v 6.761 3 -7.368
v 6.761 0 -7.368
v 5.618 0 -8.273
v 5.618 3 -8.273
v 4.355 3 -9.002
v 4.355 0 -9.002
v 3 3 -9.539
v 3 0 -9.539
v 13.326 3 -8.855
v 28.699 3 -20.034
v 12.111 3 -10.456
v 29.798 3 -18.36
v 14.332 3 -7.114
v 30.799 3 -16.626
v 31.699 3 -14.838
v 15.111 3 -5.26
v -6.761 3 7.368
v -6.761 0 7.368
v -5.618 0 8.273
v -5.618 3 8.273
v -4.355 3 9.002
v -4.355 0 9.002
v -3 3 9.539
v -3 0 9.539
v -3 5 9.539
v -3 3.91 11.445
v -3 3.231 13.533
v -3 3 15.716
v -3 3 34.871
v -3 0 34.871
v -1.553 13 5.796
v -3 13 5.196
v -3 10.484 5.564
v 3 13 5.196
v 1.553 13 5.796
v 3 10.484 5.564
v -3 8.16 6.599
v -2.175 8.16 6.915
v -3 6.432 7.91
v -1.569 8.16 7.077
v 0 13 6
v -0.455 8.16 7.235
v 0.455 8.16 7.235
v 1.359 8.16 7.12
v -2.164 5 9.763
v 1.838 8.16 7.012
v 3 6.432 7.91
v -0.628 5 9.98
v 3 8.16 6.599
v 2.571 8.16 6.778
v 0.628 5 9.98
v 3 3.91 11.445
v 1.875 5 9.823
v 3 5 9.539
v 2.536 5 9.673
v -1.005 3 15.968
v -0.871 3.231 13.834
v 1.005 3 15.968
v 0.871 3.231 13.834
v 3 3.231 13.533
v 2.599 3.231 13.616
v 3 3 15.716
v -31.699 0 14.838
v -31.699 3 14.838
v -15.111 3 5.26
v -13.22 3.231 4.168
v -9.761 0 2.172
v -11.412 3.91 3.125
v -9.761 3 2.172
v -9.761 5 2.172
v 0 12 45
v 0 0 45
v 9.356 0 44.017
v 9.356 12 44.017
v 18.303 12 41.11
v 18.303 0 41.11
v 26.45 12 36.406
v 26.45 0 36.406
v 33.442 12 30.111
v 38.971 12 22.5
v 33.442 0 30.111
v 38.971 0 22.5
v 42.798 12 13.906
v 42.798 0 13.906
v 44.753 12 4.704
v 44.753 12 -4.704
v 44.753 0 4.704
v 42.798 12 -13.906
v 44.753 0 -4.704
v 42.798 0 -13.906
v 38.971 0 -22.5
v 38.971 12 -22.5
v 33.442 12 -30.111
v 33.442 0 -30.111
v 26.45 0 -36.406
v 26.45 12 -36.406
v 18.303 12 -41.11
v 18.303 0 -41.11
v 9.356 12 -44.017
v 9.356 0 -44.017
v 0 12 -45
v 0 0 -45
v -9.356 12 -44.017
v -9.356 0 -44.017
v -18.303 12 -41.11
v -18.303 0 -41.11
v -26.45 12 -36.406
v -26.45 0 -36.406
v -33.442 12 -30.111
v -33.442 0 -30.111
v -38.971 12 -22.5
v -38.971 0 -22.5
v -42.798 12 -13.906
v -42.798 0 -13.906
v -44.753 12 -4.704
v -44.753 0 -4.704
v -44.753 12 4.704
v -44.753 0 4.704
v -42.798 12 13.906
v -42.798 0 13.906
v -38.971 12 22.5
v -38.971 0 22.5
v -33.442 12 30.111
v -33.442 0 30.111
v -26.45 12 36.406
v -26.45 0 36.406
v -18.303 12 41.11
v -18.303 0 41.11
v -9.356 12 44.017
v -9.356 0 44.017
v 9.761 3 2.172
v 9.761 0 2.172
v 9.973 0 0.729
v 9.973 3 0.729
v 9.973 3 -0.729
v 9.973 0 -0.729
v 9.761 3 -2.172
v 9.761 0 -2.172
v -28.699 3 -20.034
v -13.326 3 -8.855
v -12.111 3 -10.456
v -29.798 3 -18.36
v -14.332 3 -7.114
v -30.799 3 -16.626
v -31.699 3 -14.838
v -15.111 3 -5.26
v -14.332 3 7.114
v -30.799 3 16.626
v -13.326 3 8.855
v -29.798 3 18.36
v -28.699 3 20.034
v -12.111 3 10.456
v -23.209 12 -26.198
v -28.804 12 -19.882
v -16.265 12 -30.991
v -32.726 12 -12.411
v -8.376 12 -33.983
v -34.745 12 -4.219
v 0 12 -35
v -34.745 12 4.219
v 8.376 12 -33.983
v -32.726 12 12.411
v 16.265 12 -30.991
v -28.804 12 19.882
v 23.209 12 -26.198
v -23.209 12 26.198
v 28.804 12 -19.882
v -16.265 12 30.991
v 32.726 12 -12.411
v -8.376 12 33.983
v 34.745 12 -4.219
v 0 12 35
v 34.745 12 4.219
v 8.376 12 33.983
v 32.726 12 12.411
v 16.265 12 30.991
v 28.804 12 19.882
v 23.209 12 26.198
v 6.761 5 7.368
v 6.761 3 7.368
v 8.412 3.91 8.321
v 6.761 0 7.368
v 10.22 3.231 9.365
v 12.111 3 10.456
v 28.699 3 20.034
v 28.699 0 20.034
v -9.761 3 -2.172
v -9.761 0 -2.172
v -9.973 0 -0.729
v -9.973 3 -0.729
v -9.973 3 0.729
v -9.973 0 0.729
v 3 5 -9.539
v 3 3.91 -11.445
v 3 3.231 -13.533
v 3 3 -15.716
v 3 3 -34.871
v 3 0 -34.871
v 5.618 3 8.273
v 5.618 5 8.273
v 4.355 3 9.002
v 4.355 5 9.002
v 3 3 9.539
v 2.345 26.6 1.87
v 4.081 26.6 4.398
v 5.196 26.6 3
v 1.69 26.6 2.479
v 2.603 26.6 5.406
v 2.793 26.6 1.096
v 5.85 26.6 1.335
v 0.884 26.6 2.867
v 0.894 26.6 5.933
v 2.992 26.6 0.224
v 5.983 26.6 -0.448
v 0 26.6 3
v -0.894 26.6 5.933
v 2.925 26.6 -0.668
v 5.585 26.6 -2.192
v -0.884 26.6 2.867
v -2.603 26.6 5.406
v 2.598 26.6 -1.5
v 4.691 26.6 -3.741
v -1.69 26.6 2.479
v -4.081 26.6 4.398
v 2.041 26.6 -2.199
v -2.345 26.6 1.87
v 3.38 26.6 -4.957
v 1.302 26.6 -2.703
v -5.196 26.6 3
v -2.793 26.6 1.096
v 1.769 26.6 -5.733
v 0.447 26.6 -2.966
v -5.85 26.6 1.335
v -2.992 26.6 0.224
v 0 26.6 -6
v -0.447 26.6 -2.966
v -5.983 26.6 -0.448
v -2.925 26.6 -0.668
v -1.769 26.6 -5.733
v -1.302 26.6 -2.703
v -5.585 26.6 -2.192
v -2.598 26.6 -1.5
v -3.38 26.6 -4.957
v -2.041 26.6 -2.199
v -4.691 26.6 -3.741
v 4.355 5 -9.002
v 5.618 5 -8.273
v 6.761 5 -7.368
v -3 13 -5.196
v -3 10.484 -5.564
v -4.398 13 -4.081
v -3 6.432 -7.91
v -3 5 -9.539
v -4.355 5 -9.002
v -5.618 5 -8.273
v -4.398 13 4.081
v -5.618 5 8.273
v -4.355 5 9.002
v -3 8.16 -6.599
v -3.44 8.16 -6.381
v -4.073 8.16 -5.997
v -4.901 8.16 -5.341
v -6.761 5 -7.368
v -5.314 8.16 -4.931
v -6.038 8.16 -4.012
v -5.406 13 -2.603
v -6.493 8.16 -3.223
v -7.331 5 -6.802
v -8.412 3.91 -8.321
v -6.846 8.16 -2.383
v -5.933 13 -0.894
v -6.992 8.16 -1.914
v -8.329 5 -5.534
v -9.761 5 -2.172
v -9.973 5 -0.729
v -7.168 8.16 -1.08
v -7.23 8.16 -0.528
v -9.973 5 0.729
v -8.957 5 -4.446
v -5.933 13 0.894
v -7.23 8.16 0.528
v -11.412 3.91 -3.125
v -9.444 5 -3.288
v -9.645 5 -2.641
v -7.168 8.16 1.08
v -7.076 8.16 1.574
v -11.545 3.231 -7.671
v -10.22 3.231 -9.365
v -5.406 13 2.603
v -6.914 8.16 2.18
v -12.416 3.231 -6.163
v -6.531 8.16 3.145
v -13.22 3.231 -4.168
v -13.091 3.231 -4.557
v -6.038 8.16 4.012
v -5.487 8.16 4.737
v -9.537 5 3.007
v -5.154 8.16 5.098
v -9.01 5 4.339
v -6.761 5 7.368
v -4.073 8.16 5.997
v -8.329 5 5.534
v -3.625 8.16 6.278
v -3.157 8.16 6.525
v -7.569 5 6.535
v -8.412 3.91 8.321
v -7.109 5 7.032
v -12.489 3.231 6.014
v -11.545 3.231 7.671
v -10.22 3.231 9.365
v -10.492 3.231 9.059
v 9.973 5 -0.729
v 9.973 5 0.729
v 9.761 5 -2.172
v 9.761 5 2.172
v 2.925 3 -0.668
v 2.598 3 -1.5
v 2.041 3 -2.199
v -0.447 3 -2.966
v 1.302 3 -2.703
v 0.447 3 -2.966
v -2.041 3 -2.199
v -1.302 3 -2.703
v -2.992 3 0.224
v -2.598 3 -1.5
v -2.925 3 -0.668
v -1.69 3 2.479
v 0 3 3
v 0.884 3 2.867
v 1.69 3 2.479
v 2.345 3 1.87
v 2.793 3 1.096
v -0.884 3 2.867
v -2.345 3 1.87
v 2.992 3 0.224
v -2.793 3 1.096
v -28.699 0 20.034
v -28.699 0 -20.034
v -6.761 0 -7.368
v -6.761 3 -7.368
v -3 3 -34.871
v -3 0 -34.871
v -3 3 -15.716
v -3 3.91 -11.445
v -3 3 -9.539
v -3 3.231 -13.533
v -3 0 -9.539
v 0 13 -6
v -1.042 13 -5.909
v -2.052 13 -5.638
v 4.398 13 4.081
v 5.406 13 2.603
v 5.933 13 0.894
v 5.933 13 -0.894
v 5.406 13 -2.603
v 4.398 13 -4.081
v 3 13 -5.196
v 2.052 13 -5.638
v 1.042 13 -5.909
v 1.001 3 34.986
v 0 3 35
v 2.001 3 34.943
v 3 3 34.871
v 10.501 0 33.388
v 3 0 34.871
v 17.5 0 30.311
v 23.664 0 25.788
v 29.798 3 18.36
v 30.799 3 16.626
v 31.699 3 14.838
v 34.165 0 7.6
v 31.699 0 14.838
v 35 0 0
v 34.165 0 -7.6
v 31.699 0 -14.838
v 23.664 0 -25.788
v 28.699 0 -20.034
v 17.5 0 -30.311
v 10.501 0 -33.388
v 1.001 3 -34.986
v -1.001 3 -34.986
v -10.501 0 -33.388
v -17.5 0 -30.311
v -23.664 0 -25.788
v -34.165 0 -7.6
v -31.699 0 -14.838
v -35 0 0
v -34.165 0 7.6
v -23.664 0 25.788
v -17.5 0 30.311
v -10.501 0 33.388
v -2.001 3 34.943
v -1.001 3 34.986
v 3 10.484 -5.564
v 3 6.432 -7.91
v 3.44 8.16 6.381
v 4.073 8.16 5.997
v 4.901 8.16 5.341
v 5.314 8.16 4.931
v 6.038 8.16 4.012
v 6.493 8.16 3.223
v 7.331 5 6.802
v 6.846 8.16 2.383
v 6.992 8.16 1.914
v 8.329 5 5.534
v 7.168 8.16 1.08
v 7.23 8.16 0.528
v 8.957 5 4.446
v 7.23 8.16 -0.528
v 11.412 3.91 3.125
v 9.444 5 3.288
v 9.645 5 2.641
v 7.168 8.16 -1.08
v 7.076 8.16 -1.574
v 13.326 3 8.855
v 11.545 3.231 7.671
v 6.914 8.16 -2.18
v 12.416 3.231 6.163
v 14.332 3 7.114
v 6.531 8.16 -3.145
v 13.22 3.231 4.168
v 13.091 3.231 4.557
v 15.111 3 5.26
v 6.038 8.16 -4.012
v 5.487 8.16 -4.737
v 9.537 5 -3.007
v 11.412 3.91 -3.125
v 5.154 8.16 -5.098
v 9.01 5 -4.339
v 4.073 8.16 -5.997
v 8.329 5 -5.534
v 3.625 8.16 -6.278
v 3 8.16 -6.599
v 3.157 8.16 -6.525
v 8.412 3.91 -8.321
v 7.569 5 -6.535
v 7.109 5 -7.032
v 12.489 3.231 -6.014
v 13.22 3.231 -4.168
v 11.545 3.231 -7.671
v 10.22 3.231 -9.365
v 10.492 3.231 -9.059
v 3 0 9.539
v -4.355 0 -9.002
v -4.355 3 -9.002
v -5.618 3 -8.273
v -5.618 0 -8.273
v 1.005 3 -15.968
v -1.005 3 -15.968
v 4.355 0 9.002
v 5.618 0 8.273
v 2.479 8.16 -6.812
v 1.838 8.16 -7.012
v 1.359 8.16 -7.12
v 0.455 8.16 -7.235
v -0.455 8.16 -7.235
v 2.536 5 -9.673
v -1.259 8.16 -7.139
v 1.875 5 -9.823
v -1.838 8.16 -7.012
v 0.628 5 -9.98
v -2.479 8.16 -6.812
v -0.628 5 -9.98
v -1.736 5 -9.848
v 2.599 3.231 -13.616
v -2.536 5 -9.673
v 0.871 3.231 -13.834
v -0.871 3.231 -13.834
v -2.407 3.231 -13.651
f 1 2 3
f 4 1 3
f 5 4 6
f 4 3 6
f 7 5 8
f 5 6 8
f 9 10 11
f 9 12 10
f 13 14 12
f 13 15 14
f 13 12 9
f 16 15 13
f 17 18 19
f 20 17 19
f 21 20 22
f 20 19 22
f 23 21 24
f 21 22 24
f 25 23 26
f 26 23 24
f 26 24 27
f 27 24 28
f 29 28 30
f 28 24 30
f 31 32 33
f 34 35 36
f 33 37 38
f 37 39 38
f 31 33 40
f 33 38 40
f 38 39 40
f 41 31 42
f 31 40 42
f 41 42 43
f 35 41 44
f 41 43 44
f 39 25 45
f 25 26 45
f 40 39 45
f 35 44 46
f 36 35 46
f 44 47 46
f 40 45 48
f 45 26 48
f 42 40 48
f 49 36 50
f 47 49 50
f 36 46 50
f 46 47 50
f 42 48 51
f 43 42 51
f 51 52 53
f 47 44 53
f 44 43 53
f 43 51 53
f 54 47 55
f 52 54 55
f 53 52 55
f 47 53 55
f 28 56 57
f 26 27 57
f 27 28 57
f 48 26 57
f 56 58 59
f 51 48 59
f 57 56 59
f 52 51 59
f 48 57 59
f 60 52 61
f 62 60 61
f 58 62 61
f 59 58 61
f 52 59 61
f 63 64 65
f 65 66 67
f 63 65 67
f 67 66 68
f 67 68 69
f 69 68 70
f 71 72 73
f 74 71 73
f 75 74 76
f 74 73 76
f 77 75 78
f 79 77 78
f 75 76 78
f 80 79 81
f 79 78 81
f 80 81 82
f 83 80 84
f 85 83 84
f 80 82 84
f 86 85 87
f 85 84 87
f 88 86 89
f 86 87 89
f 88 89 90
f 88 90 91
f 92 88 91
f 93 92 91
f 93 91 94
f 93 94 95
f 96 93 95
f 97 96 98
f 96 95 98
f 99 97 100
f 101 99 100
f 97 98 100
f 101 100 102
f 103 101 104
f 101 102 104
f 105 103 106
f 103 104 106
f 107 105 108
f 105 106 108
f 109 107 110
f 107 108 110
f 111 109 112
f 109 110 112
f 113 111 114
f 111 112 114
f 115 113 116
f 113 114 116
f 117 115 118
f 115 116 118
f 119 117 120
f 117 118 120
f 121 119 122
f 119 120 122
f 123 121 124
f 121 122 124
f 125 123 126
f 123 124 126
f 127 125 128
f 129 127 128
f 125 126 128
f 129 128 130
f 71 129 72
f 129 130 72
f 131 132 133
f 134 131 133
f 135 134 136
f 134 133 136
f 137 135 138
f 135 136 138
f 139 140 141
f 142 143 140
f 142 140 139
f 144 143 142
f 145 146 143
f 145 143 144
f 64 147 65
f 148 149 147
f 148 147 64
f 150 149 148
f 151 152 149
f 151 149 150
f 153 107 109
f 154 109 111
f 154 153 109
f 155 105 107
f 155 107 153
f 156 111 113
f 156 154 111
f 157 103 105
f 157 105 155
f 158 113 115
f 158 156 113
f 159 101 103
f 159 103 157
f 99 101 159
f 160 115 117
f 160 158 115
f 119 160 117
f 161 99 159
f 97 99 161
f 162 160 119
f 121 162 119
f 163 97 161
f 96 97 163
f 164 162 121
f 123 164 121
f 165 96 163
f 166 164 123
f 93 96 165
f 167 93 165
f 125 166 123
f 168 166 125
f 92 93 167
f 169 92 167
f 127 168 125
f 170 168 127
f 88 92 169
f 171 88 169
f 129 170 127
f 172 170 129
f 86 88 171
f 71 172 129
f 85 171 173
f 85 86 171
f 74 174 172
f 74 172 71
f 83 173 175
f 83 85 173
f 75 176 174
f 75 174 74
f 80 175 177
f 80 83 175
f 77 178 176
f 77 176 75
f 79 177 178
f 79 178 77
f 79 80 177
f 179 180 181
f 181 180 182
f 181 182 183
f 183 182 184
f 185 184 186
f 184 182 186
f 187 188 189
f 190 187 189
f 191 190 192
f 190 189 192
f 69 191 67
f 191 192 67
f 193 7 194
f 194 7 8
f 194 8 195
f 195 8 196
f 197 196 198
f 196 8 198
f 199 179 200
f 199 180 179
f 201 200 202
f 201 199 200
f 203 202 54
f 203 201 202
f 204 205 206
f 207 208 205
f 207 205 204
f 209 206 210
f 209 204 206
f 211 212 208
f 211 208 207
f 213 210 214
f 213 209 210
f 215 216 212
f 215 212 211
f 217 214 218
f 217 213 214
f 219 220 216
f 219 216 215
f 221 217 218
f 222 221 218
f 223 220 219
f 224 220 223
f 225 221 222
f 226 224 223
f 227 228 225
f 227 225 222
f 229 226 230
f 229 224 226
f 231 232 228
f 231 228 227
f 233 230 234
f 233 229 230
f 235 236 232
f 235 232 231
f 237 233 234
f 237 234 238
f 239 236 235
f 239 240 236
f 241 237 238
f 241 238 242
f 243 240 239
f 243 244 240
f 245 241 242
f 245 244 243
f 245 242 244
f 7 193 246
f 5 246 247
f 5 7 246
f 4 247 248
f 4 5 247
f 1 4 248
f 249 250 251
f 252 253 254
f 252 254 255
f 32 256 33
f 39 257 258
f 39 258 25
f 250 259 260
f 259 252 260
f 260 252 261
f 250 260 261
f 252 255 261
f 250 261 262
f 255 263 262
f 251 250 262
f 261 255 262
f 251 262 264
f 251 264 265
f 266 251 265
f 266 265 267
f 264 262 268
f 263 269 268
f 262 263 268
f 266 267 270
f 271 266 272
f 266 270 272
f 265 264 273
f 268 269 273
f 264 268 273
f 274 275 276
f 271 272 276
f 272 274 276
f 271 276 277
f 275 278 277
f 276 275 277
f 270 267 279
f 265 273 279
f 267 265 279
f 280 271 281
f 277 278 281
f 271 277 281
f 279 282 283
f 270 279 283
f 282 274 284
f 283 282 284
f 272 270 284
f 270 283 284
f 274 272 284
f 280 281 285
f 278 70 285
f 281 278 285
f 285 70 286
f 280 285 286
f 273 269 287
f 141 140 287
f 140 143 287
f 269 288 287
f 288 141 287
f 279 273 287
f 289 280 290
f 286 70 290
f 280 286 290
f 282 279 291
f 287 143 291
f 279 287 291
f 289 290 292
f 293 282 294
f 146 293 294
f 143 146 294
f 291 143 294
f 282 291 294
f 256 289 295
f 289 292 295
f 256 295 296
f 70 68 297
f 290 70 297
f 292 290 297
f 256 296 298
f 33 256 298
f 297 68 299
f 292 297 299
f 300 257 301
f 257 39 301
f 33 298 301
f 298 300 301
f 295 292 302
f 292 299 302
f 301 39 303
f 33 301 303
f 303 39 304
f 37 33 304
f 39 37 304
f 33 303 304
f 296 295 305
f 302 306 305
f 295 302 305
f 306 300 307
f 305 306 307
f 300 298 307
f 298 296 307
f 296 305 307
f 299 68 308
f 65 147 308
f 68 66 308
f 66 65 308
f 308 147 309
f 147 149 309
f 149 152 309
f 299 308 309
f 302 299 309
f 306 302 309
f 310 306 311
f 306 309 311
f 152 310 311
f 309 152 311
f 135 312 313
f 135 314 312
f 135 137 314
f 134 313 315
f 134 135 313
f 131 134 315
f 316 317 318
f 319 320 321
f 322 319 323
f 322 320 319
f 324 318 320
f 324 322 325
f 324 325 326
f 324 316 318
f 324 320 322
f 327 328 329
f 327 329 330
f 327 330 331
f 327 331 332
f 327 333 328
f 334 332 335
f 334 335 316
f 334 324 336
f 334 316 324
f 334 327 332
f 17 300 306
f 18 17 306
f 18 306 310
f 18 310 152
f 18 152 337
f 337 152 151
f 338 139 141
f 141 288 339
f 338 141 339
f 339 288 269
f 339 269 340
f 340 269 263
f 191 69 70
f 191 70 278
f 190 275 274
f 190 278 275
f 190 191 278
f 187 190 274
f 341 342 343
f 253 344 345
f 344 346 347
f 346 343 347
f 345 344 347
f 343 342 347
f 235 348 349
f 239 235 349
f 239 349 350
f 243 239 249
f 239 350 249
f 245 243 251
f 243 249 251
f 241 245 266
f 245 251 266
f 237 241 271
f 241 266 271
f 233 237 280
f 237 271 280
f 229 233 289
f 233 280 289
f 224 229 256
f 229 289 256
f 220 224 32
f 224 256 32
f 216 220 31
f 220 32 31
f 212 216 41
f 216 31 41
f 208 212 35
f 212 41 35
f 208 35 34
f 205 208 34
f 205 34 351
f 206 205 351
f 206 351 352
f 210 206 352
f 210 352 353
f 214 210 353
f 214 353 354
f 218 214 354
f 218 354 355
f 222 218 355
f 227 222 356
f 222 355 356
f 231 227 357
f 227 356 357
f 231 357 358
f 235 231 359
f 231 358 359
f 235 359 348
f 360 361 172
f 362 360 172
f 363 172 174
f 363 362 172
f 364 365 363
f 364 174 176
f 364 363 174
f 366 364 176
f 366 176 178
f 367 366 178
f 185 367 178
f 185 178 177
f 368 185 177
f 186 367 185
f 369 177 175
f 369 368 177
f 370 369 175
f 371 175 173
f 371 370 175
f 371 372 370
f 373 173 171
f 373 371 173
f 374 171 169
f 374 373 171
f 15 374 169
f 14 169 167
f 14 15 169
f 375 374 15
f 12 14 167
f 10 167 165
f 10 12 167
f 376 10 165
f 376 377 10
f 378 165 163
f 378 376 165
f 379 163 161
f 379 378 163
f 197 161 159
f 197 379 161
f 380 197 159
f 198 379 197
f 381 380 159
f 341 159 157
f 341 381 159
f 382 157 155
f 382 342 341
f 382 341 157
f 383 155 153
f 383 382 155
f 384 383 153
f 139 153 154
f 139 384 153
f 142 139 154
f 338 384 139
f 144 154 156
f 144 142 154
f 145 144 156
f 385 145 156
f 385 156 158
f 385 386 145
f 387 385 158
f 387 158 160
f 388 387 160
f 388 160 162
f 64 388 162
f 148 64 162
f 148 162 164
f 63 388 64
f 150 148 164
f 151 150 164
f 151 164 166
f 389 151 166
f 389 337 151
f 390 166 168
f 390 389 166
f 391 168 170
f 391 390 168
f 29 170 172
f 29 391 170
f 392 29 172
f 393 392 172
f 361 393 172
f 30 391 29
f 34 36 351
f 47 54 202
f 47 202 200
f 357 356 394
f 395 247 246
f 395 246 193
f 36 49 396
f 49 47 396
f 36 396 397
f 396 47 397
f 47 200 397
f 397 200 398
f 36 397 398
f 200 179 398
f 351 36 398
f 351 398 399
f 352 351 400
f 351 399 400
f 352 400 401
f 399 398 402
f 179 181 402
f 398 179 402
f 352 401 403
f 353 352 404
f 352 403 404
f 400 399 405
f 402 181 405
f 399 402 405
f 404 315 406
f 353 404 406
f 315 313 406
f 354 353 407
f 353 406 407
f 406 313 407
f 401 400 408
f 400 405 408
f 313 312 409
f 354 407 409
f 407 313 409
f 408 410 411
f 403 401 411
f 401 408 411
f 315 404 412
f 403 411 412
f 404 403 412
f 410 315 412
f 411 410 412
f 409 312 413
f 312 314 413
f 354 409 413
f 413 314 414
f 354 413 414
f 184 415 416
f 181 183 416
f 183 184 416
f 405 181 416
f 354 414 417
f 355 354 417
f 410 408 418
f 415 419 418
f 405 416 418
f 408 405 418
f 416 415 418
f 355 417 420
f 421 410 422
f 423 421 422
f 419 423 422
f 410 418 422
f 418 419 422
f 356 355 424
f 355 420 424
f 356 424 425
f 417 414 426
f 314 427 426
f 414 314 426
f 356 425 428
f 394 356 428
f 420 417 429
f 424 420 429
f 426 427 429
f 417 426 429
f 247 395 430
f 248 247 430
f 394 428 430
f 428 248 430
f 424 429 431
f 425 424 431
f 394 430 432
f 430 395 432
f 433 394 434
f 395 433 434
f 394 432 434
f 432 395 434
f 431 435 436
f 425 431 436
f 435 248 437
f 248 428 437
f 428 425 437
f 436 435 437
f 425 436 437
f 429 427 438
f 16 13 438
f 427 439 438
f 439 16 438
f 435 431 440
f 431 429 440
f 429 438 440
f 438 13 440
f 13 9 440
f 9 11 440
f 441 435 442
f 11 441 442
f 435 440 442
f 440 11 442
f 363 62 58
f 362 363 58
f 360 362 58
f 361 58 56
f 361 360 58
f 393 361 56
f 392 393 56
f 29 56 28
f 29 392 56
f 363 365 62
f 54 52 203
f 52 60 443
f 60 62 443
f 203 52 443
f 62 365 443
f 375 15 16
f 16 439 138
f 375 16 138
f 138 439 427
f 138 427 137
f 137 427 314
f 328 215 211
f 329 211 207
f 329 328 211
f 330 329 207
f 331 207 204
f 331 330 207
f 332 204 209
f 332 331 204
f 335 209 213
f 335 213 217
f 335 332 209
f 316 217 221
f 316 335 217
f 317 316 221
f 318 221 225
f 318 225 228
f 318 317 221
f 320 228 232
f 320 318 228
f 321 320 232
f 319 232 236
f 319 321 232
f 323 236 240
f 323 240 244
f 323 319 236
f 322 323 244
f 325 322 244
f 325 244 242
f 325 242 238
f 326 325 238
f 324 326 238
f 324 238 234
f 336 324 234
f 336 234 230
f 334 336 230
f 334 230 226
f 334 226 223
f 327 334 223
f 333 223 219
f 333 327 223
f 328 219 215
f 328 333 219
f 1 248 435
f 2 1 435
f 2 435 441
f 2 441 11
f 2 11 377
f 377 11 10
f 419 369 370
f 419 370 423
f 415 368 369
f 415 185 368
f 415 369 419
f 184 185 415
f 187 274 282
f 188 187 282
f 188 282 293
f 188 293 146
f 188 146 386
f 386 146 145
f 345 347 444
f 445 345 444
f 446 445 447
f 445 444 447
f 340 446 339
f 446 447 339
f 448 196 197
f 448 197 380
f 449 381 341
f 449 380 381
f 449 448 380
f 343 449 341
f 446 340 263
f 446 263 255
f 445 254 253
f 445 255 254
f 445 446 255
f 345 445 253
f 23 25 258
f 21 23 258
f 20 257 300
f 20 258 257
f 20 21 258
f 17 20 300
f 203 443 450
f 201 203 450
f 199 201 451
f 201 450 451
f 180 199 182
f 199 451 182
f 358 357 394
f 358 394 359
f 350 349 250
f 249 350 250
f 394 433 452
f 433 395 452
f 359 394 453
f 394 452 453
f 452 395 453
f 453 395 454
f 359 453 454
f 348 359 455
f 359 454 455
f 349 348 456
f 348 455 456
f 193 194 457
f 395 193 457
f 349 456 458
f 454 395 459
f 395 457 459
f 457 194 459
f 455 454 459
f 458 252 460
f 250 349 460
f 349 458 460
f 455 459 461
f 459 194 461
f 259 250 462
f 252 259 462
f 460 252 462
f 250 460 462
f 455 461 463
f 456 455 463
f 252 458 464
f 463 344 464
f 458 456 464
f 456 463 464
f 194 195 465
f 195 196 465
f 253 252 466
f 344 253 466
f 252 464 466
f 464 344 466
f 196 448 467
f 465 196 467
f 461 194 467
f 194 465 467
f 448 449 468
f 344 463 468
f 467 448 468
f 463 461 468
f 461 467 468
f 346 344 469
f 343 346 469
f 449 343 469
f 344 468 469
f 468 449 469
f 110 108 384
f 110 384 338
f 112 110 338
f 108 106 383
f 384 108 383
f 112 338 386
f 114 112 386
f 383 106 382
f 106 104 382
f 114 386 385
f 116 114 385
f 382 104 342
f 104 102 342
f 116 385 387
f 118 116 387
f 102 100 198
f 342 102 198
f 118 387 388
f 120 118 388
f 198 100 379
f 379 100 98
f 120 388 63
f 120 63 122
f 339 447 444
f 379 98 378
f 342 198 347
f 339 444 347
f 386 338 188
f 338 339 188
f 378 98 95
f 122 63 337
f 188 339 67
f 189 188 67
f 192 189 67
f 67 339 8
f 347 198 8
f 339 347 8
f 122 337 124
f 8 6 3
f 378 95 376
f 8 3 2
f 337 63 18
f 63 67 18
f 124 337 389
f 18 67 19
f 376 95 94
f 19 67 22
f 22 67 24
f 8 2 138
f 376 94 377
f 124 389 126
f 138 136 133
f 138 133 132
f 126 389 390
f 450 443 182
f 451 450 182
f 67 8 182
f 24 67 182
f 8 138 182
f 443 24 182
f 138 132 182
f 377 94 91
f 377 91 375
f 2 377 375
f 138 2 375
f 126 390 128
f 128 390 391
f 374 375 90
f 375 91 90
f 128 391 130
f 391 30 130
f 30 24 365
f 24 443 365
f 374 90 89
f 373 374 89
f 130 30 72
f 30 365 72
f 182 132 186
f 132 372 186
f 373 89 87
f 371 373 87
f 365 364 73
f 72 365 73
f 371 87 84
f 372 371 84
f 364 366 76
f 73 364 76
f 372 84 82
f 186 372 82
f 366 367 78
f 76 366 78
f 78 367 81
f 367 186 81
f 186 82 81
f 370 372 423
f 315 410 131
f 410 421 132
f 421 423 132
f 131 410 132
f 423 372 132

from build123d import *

# Parameters (mm, degrees)
SKETCH2_R           = 45
SKETCH2_R_2         = 35
BOSS_EXTRUDE1_DEPTH = 12
BOSS_EXTRUDE2_DEPTH = 3
CIRPATTERN1_COUNT   = 6
SKETCH4_R           = 6
SKETCH4_R_2         = 3
BOSS_EXTRUDE3_DEPTH = 23.6
FILLET1_R           = 10


with BuildPart() as part:
    # Sketch2 → Boss-Extrude1 (new body)
    with BuildSketch(Plane(origin=(0, 0, 0), x_dir=(1, 0, 0), z_dir=(0, 1, 0))):
        with Locations(Location((0, 0, 0), (0, 0, 270))):
            Circle(SKETCH2_R)
        with Locations(Location((0, 0, 0), (0, 0, 270))):
            Circle(SKETCH2_R_2, mode=Mode.SUBTRACT)
    extrude(amount=BOSS_EXTRUDE1_DEPTH)

    # Sketch3 → Boss-Extrude2 (add)
    with BuildSketch(Plane.XZ):
        with BuildLine():
            Line((-3, 40.114762923), (3, 40.114762923))
            Line((3, 40.114762923), (3, 9.539392014))
            ThreePointArc((3, 9.539392014), (0, -10), (-3, 9.539392014))
            Line((-3, 9.539392014), (-3, 40.114762923))
        make_face()
    boss_extrude2 = extrude(amount=-BOSS_EXTRUDE2_DEPTH)

    # CirPattern1: Boss-Extrude2 ×6 about axis
    cirpattern1_axis = Axis((0, 0, 0), (0, 1, 0))
    for i in range(1, CIRPATTERN1_COUNT):
        add(boss_extrude2.rotate(cirpattern1_axis, i * 360 / CIRPATTERN1_COUNT))

    # Sketch4 → Boss-Extrude3 (add)
    with BuildSketch(Plane(origin=(0, 3, 0), x_dir=(1, 0, 0), z_dir=(0, 1, 0))):
        with Locations(Location((0, 0, 0), (0, 0, 90))):
            Circle(SKETCH4_R)
        with Locations(Location((0, 0, 0), (0, 0, 270))):
            Circle(SKETCH4_R_2, mode=Mode.SUBTRACT)
    extrude(amount=BOSS_EXTRUDE3_DEPTH)

    # Fillet1
    # the kernel refuses this fillet: 10 mm, written as the material it adds along each edge
    with BuildSketch(Plane(origin=(0, 3, 0), x_dir=(0, 0, -1), z_dir=(1, 0, 0))) as fillet1_piece_1_section:
        with BuildLine():
            CenterArc((6 + FILLET1_R, FILLET1_R), FILLET1_R, 180, 90)
            Line((6, FILLET1_R), (6, 0))
            Line((6, 0), (6 + FILLET1_R, 0))
        make_face()
    fillet1_piece_1 = revolve(axis=Axis((0, 3, 0), (0, 1, 0)), mode=Mode.PRIVATE)
    fillet1_piece_1 = split(fillet1_piece_1, bisect_by=Plane(origin=(3, 3.588688927, -11.330954683), z_dir=(-1, 0, 0)), keep=Keep.TOP, mode=Mode.PRIVATE)
    fillet1_piece_1 = split(fillet1_piece_1, bisect_by=Plane(origin=(-3, 3.588688927, -11.330954683), z_dir=(1, 0, 0)), keep=Keep.TOP, mode=Mode.PRIVATE)
    add(fillet1_piece_1)
    with BuildSketch(Plane(origin=(0, 3, 0), x_dir=(0, 0, -1), z_dir=(1, 0, 0))) as fillet1_piece_2_section:
        with BuildLine():
            CenterArc((6 + FILLET1_R, FILLET1_R), FILLET1_R, 180, 90)
            Line((6, FILLET1_R), (6, 0))
            Line((6, 0), (6 + FILLET1_R, 0))
        make_face()
    fillet1_piece_2 = revolve(axis=Axis((0, 3, 0), (0, 1, 0)), mode=Mode.PRIVATE)
    fillet1_piece_2 = fillet1_piece_2 & Plane(origin=(0, 4.321014417, 0), x_dir=(0.2999999999999998, 0, 0.9539392014169458), z_dir=(0, -1, 0)) * Cylinder(10, 64, mode=Mode.PRIVATE)
    add(fillet1_piece_2)
    with BuildSketch(Plane(origin=(0, 3, 0), x_dir=(0, 0, -1), z_dir=(1, 0, 0))) as fillet1_piece_3_section:
        with BuildLine():
            CenterArc((6 + FILLET1_R, FILLET1_R), FILLET1_R, 180, 90)
            Line((6, FILLET1_R), (6, 0))
            Line((6, 0), (6 + FILLET1_R, 0))
        make_face()
    fillet1_piece_3 = revolve(axis=Axis((0, 3, 0), (0, 1, 0)), mode=Mode.PRIVATE)
    fillet1_piece_3 = split(fillet1_piece_3, bisect_by=Plane(origin=(-11.312894604, 3.588688928, -3.06740113), z_dir=(0.5000000000000002, 0, -0.8660254037844386)), keep=Keep.TOP, mode=Mode.PRIVATE)
    fillet1_piece_3 = split(fillet1_piece_3, bisect_by=Plane(origin=(-8.312894604, 3.588688928, -8.263553553), z_dir=(-0.5000000000000001, 0, 0.8660254037844387)), keep=Keep.TOP, mode=Mode.PRIVATE)
    add(fillet1_piece_3)
    with BuildSketch(Plane(origin=(0, 3, 0), x_dir=(0, 0, -1), z_dir=(1, 0, 0))) as fillet1_piece_4_section:
        with BuildLine():
            CenterArc((6 + FILLET1_R, FILLET1_R), FILLET1_R, 180, 90)
            Line((6, FILLET1_R), (6, 0))
            Line((6, 0), (6 + FILLET1_R, 0))
        make_face()
    fillet1_piece_4 = revolve(axis=Axis((0, 3, 0), (0, 1, 0)), mode=Mode.PRIVATE)
    fillet1_piece_4 = split(fillet1_piece_4, bisect_by=Plane(origin=(11.312894604, 3.588688928, -3.06740113), z_dir=(-0.4999999999999998, 0, -0.8660254037844388)), keep=Keep.TOP, mode=Mode.PRIVATE)
    fillet1_piece_4 = split(fillet1_piece_4, bisect_by=Plane(origin=(8.312894604, 3.588688928, -8.263553553), z_dir=(0.49999999999999994, 0, 0.8660254037844389)), keep=Keep.TOP, mode=Mode.PRIVATE)
    add(fillet1_piece_4)


solid = part.part
